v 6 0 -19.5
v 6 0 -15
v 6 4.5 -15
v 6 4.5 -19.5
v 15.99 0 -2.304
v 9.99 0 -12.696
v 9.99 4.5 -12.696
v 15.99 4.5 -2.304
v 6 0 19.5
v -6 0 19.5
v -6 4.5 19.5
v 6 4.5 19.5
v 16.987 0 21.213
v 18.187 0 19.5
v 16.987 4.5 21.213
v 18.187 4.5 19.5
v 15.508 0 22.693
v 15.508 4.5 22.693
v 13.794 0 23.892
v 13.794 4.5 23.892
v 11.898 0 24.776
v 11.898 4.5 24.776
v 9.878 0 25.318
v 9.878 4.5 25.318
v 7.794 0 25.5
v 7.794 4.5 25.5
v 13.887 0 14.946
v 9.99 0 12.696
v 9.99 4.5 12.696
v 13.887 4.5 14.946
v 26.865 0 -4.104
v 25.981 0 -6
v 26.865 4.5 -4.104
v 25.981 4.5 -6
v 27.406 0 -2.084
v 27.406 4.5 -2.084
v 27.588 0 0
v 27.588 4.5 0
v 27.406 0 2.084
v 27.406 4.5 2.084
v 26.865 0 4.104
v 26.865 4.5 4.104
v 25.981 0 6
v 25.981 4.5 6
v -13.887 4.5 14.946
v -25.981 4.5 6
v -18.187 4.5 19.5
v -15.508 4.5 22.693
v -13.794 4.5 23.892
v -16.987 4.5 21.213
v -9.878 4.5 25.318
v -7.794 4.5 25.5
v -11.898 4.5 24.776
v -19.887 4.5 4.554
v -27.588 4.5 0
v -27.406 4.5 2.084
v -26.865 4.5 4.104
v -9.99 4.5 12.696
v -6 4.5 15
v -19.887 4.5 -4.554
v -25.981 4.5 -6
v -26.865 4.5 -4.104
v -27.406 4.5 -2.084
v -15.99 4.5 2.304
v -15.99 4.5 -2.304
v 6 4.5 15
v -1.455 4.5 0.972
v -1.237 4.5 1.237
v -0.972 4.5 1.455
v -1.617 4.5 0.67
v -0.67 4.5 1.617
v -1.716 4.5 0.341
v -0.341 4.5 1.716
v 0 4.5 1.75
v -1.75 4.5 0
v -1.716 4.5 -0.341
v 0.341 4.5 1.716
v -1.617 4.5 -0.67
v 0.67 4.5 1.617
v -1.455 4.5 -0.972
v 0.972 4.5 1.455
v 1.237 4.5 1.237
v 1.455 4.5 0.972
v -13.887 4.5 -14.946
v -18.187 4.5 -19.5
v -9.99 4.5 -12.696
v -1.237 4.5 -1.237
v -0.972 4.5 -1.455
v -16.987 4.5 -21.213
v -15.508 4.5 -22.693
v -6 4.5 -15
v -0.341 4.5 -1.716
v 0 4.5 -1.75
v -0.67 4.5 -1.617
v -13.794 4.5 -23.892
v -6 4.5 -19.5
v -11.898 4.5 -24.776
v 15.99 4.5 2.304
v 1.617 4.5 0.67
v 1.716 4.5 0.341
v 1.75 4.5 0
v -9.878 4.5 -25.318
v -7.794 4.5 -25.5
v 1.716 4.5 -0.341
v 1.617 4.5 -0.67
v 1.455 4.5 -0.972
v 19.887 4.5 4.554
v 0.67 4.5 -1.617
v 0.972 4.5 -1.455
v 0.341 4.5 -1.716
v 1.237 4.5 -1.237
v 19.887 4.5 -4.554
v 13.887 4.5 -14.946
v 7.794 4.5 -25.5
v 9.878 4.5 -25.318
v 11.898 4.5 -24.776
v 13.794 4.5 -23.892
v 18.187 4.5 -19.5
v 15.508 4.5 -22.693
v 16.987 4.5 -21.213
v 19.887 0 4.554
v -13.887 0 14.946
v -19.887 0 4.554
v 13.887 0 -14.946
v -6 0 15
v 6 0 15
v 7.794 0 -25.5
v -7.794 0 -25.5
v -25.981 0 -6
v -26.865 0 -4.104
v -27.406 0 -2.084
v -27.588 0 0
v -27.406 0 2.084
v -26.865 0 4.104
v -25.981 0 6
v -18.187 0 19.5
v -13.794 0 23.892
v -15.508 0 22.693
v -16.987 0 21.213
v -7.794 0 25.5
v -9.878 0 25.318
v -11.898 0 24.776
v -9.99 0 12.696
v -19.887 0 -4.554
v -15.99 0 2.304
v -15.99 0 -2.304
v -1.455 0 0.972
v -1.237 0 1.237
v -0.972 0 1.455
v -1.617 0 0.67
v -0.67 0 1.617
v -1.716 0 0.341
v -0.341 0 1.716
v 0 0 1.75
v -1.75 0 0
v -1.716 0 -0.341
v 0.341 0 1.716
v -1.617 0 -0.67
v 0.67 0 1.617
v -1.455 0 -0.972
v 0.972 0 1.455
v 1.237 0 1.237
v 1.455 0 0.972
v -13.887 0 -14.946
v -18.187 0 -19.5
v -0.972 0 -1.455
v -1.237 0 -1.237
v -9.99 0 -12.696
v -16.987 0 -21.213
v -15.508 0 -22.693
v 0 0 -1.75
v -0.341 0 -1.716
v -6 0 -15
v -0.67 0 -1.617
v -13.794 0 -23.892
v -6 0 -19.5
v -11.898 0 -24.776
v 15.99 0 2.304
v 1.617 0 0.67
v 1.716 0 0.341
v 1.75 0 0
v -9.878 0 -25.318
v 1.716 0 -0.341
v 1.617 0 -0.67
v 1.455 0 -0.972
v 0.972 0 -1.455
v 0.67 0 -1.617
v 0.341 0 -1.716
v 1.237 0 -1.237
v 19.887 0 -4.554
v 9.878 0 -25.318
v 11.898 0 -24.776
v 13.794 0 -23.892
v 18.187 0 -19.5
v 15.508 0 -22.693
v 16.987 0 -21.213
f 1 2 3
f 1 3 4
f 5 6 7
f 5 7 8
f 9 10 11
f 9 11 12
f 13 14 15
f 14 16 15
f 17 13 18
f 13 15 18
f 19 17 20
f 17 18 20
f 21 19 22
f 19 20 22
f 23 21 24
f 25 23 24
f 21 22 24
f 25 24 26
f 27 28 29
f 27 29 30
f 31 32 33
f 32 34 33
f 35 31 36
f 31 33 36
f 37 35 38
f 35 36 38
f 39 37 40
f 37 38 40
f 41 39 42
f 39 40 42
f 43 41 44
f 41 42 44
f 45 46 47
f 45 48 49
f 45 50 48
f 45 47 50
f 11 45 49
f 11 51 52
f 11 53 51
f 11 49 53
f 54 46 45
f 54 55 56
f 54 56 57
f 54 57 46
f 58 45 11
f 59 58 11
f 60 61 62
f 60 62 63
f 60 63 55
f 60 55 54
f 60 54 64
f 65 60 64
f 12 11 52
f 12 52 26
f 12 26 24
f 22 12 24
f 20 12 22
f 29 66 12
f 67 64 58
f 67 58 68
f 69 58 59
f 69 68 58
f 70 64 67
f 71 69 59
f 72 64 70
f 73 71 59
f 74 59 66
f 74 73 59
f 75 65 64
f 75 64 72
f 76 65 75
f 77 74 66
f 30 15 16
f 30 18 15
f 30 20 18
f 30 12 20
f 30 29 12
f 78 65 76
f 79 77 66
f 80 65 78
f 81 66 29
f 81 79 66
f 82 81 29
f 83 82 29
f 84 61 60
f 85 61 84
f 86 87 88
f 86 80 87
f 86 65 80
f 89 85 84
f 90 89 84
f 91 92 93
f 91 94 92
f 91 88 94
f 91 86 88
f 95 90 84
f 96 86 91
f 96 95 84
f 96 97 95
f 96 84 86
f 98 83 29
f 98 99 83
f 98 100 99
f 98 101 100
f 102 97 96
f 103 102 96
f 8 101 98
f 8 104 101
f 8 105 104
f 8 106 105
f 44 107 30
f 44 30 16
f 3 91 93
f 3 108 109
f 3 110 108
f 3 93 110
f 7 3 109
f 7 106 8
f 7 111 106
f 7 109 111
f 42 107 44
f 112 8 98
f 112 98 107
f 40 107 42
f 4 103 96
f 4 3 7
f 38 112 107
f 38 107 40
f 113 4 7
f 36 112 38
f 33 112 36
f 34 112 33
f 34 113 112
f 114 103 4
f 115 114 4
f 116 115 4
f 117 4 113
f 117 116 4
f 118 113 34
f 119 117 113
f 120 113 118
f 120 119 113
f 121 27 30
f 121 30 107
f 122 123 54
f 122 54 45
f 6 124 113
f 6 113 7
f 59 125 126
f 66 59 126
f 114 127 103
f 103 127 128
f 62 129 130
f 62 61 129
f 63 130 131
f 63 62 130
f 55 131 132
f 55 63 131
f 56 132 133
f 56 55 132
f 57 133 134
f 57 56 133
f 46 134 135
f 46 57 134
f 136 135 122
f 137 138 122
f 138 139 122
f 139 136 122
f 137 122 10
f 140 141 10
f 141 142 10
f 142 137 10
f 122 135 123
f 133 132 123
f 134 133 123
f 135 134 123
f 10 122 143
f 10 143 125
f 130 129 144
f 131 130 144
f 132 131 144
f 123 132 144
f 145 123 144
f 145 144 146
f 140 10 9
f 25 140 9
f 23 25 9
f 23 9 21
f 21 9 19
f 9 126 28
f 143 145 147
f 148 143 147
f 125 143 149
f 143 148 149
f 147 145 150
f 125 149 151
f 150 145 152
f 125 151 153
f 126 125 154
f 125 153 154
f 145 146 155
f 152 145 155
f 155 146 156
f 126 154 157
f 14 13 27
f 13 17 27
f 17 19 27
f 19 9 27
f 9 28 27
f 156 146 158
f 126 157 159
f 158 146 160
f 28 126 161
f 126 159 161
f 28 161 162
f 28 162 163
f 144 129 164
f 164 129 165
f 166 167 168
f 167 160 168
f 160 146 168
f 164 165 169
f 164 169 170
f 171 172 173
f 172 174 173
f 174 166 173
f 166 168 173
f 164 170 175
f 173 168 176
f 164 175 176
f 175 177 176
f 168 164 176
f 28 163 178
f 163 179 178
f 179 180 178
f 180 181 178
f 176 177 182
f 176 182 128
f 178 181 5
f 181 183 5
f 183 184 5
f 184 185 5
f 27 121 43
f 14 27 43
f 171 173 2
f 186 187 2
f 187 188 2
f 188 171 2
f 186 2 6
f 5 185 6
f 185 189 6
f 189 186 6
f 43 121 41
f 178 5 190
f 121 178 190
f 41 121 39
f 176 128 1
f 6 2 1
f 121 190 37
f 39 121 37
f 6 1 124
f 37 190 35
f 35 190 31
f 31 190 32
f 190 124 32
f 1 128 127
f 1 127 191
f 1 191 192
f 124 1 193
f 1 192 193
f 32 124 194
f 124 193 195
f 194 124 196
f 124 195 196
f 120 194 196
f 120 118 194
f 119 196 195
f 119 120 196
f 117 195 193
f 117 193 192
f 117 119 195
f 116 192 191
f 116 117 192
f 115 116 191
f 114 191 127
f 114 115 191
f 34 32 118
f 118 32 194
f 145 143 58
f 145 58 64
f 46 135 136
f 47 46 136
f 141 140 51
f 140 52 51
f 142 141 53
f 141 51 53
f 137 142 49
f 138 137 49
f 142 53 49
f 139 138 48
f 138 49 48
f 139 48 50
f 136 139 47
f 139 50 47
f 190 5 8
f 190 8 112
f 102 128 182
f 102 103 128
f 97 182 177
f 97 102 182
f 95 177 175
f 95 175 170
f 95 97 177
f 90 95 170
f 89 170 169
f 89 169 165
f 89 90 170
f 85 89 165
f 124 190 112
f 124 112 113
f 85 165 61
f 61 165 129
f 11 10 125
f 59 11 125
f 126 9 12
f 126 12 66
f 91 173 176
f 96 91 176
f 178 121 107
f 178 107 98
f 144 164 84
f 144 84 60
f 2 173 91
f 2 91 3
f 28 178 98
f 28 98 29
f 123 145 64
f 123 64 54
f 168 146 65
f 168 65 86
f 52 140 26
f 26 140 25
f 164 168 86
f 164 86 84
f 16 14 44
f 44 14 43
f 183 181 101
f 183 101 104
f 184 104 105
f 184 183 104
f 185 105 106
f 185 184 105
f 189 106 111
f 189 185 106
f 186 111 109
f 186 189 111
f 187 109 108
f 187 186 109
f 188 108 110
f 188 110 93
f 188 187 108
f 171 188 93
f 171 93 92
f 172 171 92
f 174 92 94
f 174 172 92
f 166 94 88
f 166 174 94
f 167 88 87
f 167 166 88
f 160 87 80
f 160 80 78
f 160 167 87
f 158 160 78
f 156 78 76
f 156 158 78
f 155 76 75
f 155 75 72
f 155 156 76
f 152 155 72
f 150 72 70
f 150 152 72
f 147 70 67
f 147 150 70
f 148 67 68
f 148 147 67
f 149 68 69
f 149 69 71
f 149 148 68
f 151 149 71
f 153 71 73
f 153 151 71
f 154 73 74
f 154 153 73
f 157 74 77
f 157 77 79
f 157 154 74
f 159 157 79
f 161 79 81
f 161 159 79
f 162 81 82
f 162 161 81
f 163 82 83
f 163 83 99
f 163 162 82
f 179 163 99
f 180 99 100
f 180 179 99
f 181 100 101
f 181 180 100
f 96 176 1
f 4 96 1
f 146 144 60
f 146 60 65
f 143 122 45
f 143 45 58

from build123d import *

# Parameters (mm, degrees)
SKETCH_1_R      = 1.75
SKETCH_1_W      = 12
SKETCH_1_H      = 4.5
EXTRUDE_1_DEPTH = 4.5
FILLET_1_R      = 12


with BuildPart() as part:
    # 草图1 → 凸台-拉伸1 (new body)
    with BuildSketch(Plane(origin=(0, 0, 0), x_dir=(1, 0, 0), z_dir=(0, 1, 0))):
        Polygon((29.444863729, 0), (14.722431864, 25.5), (-14.722431864, 25.5), (-29.444863729, 0), (-14.722431864, -25.5), (14.722431864, -25.5), align=None)
        Circle(SKETCH_1_R, mode=Mode.SUBTRACT)
        Polygon((13.887495374, 14.946152423), (9.990381057, 12.696152423), (15.990381057, 2.303847577), (19.887495374, 4.553847577), align=None, mode=Mode.SUBTRACT)
        with Locations((0, 17.25)):
            Rectangle(SKETCH_1_W, SKETCH_1_H, mode=Mode.SUBTRACT)
        Polygon((19.887495374, -4.553847577), (15.990381057, -2.303847577), (9.990381057, -12.696152423), (13.887495374, -14.946152423), align=None, mode=Mode.SUBTRACT)
        with Locations((0, -17.25)):
            Rectangle(SKETCH_1_W, SKETCH_1_H, mode=Mode.SUBTRACT)
        Polygon((-13.887495374, -14.946152423), (-9.990381057, -12.696152423), (-15.990381057, -2.303847577), (-19.887495374, -4.553847577), align=None, mode=Mode.SUBTRACT)
        Polygon((-19.887495374, 4.553847577), (-15.990381057, 2.303847577), (-9.990381057, 12.696152423), (-13.887495374, 14.946152423), align=None, mode=Mode.SUBTRACT)
    extrude(amount=EXTRUDE_1_DEPTH)

    # 圆角1
    fillet_1_edges = [part.edges().sort_by_distance(p)[0] for p in [
        (14.722431864, 2.25, 25.5),
        (-14.722431864, 2.25, 25.5),
        (-29.444863729, 2.25, 0),
        (-14.722431864, 2.25, -25.5),
        (14.722431864, 2.25, -25.5),
        (29.444863729, 2.25, 0),
    ]]
    fillet(fillet_1_edges, radius=FILLET_1_R)


solid = part.part
